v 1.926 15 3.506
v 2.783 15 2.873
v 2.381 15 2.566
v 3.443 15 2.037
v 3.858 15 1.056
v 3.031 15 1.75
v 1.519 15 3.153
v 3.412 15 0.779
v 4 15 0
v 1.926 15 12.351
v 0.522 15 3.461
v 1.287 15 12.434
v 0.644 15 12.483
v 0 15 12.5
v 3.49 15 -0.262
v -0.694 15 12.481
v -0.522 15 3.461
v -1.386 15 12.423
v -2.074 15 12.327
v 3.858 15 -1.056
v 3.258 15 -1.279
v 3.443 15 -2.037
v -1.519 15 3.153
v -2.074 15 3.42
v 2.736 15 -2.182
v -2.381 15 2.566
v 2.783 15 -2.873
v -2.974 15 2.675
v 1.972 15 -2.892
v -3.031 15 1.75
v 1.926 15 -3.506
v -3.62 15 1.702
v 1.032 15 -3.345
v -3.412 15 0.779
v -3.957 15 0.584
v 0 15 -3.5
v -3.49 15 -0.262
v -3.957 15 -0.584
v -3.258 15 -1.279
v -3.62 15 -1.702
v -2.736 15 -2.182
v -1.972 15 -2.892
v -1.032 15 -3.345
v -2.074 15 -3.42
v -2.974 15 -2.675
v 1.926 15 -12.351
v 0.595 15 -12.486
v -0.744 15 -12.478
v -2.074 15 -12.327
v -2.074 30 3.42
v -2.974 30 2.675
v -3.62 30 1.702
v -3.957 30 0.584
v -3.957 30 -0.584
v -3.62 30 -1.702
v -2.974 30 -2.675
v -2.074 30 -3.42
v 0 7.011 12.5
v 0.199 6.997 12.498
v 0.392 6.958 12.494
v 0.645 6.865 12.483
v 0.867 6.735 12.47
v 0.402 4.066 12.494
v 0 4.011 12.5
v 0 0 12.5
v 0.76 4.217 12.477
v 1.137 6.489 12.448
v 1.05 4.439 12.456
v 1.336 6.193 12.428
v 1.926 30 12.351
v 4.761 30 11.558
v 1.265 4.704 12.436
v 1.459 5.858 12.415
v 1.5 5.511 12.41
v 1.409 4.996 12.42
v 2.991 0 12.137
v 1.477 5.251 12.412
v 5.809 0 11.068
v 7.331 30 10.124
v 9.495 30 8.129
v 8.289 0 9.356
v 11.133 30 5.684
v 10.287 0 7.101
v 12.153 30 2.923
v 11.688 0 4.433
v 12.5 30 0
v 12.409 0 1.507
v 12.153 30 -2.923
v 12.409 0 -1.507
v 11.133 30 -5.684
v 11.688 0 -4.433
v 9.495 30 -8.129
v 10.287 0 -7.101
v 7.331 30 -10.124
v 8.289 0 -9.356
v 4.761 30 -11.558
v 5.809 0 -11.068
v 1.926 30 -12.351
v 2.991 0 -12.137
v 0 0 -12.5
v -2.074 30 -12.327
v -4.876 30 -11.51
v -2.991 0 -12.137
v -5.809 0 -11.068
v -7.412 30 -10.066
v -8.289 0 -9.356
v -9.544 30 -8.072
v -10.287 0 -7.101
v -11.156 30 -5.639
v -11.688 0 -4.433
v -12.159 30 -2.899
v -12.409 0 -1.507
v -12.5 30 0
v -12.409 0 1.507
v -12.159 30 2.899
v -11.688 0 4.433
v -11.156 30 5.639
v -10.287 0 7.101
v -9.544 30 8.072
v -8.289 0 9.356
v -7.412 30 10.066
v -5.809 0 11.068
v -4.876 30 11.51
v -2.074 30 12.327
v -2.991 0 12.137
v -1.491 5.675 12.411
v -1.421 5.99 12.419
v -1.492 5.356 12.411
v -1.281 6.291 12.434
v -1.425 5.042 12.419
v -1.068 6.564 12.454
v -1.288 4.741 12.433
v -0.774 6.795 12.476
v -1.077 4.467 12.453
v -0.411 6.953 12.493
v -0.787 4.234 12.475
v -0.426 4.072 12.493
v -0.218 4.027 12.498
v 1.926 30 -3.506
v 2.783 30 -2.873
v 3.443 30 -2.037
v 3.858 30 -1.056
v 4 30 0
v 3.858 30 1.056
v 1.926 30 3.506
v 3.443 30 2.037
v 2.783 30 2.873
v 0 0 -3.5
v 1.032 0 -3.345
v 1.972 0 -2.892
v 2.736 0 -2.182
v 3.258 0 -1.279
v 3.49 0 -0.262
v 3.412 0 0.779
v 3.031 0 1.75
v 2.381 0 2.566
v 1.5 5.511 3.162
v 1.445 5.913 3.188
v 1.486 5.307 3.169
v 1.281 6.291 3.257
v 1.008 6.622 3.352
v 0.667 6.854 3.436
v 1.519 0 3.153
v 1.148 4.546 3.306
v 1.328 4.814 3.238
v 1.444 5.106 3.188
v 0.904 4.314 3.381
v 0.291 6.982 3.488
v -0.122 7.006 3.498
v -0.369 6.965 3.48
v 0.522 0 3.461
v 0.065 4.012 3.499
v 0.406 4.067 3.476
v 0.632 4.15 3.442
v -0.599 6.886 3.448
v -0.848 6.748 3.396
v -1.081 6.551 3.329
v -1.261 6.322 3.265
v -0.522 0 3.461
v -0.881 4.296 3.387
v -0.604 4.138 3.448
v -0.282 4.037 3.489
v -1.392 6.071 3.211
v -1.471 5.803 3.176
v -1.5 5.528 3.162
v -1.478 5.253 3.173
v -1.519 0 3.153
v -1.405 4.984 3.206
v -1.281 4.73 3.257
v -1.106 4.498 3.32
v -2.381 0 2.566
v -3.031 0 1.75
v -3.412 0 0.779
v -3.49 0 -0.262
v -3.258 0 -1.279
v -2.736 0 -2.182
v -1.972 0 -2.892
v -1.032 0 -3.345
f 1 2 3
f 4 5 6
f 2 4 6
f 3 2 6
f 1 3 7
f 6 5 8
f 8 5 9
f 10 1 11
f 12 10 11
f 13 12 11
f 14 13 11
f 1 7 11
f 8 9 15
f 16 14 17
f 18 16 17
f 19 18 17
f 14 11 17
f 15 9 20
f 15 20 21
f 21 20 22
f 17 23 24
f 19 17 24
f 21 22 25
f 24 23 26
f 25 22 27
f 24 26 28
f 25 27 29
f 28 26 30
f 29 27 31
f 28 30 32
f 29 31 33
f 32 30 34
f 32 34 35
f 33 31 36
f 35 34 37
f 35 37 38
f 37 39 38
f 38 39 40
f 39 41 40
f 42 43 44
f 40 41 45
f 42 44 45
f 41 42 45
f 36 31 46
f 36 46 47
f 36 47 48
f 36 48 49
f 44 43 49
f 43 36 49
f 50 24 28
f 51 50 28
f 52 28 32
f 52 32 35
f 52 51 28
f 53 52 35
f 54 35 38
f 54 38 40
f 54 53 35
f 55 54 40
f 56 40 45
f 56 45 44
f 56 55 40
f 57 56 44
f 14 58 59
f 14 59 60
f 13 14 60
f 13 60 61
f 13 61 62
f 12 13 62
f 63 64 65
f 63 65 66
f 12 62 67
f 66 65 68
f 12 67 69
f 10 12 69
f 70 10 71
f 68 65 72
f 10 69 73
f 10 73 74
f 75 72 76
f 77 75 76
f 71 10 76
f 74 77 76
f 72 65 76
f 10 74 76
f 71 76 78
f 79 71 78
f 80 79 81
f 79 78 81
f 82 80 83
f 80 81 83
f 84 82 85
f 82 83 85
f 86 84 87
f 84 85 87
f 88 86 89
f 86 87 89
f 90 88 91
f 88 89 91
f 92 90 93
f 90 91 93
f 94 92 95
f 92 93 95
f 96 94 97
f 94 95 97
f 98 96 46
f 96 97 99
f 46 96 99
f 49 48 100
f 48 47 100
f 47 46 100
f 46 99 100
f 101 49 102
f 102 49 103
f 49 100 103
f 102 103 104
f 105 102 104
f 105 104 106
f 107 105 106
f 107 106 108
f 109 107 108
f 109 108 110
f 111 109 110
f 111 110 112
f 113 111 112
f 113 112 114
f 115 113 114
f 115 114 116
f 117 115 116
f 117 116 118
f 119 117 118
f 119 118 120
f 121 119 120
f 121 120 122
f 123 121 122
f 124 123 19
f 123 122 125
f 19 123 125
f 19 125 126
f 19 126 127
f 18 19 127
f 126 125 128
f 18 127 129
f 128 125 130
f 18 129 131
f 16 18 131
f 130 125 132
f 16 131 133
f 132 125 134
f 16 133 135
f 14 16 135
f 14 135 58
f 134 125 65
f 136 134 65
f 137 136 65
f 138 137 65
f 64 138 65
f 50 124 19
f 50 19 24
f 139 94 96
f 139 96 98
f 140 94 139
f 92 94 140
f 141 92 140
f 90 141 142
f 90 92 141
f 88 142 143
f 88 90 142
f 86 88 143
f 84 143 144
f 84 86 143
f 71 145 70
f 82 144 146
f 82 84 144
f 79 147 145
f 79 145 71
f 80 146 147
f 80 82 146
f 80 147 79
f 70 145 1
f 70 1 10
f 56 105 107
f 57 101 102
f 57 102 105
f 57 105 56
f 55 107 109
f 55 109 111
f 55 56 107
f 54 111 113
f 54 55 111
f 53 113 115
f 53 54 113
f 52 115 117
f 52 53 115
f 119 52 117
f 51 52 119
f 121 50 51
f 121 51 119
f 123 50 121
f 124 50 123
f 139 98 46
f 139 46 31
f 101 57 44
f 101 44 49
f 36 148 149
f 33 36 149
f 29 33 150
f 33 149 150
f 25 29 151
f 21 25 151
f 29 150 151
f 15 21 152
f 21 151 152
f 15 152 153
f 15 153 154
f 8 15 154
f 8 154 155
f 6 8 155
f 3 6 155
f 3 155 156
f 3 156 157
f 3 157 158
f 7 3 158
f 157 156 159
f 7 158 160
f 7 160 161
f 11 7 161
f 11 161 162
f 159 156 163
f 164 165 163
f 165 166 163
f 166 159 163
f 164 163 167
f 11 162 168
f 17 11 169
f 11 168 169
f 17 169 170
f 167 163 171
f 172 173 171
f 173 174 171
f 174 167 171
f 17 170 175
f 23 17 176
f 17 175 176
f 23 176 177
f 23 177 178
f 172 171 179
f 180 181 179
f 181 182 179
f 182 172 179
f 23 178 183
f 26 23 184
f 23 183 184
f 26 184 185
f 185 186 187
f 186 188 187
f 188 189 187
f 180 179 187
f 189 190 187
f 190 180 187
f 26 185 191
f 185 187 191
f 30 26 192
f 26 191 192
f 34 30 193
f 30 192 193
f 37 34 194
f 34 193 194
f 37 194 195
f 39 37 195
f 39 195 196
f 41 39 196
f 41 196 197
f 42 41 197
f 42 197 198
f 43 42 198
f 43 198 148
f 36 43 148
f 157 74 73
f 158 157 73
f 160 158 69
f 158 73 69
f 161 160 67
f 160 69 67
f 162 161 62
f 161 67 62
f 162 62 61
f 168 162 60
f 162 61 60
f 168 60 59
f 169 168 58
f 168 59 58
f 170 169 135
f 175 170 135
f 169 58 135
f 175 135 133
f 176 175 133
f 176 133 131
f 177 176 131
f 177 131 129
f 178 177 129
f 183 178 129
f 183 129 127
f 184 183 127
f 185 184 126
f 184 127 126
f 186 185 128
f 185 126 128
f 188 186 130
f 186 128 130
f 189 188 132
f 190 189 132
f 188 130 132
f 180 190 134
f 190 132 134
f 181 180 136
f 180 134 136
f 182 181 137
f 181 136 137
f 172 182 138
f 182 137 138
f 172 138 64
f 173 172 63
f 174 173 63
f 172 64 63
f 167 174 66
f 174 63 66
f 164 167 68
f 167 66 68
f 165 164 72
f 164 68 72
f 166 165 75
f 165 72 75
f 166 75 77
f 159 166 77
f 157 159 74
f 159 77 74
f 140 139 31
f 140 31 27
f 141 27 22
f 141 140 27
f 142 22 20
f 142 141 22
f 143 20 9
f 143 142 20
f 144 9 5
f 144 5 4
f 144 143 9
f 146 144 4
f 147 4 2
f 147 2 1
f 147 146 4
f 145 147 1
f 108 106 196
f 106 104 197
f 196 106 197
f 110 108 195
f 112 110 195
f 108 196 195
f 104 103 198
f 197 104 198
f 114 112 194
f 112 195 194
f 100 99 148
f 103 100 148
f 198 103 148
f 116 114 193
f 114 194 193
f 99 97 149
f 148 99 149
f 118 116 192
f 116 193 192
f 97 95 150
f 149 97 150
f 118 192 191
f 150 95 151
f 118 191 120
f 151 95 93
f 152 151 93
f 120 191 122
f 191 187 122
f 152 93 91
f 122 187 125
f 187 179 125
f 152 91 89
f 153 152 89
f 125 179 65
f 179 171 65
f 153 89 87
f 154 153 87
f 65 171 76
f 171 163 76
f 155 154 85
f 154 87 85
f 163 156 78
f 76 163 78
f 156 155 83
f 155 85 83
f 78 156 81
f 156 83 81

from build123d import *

# Parameters (mm, degrees)
CROQUIS1_R              = 12.5
SALIENTE_EXTRUIR1_DEPTH = 30
CORTAR_EXTRUIR1_DEPTH   = 15
CROQUIS3_R              = 3.5
CORTAR_EXTRUIR2_DEPTH   = 15
CROQUIS4_R              = 1.5
CORTAR_EXTRUIR3_DEPTH   = 15


with BuildPart() as part:
    # Croquis1 → Saliente-Extruir1 (new body)
    with BuildSketch(Plane(origin=(0, 0, 0), x_dir=(1, 0, 0), z_dir=(0, 1, 0))):
        with Locations(Location((0, 0, 0), (0, 0, 270))):
            Circle(CROQUIS1_R)
    extrude(amount=SALIENTE_EXTRUIR1_DEPTH)

    # Croquis2 → Cortar-Extruir1 (cut)
    with BuildSketch(Plane(origin=(0, 30, 0), x_dir=(1, 0, 0), z_dir=(0, 1, 0))):
        with BuildLine():
            Line((-2.073774887, 3.420447006), (-2.073774887, 12.856138783))
            Line((-2.073774887, 12.856138783), (1.926225113, 12.856138783))
            Line((1.926225113, 12.856138783), (1.926225113, 3.505660681))
            ThreePointArc((1.926225113, 3.505660681), (4, 0), (1.926225113, -3.505660681))
            Line((1.926225113, -3.505660681), (1.926225113, -12.772374377))
            Line((1.926225113, -12.772374377), (-2.073774887, -12.772374377))
            Line((-2.073774887, -12.772374377), (-2.073774887, -3.420447006))
            ThreePointArc((-2.073774887, -3.420447006), (-4, 0), (-2.073774887, 3.420447006))
        make_face()
    extrude(amount=-CORTAR_EXTRUIR1_DEPTH, mode=Mode.SUBTRACT)

    # Croquis3 → Cortar-Extruir2 (cut)
    with BuildSketch(Plane.XZ):
        with Locations(Location((0, 0, 0), (0, 0, 270))):
            Circle(CROQUIS3_R)
    extrude(amount=-CORTAR_EXTRUIR2_DEPTH, mode=Mode.SUBTRACT)

    # Croquis4 → Cortar-Extruir3 (cut)
    with BuildSketch(Plane.XY.offset(15)):
        with Locations((0, 5.510659623)):
            Circle(CROQUIS4_R)
    extrude(amount=-CORTAR_EXTRUIR3_DEPTH, mode=Mode.SUBTRACT)


solid = part.part
